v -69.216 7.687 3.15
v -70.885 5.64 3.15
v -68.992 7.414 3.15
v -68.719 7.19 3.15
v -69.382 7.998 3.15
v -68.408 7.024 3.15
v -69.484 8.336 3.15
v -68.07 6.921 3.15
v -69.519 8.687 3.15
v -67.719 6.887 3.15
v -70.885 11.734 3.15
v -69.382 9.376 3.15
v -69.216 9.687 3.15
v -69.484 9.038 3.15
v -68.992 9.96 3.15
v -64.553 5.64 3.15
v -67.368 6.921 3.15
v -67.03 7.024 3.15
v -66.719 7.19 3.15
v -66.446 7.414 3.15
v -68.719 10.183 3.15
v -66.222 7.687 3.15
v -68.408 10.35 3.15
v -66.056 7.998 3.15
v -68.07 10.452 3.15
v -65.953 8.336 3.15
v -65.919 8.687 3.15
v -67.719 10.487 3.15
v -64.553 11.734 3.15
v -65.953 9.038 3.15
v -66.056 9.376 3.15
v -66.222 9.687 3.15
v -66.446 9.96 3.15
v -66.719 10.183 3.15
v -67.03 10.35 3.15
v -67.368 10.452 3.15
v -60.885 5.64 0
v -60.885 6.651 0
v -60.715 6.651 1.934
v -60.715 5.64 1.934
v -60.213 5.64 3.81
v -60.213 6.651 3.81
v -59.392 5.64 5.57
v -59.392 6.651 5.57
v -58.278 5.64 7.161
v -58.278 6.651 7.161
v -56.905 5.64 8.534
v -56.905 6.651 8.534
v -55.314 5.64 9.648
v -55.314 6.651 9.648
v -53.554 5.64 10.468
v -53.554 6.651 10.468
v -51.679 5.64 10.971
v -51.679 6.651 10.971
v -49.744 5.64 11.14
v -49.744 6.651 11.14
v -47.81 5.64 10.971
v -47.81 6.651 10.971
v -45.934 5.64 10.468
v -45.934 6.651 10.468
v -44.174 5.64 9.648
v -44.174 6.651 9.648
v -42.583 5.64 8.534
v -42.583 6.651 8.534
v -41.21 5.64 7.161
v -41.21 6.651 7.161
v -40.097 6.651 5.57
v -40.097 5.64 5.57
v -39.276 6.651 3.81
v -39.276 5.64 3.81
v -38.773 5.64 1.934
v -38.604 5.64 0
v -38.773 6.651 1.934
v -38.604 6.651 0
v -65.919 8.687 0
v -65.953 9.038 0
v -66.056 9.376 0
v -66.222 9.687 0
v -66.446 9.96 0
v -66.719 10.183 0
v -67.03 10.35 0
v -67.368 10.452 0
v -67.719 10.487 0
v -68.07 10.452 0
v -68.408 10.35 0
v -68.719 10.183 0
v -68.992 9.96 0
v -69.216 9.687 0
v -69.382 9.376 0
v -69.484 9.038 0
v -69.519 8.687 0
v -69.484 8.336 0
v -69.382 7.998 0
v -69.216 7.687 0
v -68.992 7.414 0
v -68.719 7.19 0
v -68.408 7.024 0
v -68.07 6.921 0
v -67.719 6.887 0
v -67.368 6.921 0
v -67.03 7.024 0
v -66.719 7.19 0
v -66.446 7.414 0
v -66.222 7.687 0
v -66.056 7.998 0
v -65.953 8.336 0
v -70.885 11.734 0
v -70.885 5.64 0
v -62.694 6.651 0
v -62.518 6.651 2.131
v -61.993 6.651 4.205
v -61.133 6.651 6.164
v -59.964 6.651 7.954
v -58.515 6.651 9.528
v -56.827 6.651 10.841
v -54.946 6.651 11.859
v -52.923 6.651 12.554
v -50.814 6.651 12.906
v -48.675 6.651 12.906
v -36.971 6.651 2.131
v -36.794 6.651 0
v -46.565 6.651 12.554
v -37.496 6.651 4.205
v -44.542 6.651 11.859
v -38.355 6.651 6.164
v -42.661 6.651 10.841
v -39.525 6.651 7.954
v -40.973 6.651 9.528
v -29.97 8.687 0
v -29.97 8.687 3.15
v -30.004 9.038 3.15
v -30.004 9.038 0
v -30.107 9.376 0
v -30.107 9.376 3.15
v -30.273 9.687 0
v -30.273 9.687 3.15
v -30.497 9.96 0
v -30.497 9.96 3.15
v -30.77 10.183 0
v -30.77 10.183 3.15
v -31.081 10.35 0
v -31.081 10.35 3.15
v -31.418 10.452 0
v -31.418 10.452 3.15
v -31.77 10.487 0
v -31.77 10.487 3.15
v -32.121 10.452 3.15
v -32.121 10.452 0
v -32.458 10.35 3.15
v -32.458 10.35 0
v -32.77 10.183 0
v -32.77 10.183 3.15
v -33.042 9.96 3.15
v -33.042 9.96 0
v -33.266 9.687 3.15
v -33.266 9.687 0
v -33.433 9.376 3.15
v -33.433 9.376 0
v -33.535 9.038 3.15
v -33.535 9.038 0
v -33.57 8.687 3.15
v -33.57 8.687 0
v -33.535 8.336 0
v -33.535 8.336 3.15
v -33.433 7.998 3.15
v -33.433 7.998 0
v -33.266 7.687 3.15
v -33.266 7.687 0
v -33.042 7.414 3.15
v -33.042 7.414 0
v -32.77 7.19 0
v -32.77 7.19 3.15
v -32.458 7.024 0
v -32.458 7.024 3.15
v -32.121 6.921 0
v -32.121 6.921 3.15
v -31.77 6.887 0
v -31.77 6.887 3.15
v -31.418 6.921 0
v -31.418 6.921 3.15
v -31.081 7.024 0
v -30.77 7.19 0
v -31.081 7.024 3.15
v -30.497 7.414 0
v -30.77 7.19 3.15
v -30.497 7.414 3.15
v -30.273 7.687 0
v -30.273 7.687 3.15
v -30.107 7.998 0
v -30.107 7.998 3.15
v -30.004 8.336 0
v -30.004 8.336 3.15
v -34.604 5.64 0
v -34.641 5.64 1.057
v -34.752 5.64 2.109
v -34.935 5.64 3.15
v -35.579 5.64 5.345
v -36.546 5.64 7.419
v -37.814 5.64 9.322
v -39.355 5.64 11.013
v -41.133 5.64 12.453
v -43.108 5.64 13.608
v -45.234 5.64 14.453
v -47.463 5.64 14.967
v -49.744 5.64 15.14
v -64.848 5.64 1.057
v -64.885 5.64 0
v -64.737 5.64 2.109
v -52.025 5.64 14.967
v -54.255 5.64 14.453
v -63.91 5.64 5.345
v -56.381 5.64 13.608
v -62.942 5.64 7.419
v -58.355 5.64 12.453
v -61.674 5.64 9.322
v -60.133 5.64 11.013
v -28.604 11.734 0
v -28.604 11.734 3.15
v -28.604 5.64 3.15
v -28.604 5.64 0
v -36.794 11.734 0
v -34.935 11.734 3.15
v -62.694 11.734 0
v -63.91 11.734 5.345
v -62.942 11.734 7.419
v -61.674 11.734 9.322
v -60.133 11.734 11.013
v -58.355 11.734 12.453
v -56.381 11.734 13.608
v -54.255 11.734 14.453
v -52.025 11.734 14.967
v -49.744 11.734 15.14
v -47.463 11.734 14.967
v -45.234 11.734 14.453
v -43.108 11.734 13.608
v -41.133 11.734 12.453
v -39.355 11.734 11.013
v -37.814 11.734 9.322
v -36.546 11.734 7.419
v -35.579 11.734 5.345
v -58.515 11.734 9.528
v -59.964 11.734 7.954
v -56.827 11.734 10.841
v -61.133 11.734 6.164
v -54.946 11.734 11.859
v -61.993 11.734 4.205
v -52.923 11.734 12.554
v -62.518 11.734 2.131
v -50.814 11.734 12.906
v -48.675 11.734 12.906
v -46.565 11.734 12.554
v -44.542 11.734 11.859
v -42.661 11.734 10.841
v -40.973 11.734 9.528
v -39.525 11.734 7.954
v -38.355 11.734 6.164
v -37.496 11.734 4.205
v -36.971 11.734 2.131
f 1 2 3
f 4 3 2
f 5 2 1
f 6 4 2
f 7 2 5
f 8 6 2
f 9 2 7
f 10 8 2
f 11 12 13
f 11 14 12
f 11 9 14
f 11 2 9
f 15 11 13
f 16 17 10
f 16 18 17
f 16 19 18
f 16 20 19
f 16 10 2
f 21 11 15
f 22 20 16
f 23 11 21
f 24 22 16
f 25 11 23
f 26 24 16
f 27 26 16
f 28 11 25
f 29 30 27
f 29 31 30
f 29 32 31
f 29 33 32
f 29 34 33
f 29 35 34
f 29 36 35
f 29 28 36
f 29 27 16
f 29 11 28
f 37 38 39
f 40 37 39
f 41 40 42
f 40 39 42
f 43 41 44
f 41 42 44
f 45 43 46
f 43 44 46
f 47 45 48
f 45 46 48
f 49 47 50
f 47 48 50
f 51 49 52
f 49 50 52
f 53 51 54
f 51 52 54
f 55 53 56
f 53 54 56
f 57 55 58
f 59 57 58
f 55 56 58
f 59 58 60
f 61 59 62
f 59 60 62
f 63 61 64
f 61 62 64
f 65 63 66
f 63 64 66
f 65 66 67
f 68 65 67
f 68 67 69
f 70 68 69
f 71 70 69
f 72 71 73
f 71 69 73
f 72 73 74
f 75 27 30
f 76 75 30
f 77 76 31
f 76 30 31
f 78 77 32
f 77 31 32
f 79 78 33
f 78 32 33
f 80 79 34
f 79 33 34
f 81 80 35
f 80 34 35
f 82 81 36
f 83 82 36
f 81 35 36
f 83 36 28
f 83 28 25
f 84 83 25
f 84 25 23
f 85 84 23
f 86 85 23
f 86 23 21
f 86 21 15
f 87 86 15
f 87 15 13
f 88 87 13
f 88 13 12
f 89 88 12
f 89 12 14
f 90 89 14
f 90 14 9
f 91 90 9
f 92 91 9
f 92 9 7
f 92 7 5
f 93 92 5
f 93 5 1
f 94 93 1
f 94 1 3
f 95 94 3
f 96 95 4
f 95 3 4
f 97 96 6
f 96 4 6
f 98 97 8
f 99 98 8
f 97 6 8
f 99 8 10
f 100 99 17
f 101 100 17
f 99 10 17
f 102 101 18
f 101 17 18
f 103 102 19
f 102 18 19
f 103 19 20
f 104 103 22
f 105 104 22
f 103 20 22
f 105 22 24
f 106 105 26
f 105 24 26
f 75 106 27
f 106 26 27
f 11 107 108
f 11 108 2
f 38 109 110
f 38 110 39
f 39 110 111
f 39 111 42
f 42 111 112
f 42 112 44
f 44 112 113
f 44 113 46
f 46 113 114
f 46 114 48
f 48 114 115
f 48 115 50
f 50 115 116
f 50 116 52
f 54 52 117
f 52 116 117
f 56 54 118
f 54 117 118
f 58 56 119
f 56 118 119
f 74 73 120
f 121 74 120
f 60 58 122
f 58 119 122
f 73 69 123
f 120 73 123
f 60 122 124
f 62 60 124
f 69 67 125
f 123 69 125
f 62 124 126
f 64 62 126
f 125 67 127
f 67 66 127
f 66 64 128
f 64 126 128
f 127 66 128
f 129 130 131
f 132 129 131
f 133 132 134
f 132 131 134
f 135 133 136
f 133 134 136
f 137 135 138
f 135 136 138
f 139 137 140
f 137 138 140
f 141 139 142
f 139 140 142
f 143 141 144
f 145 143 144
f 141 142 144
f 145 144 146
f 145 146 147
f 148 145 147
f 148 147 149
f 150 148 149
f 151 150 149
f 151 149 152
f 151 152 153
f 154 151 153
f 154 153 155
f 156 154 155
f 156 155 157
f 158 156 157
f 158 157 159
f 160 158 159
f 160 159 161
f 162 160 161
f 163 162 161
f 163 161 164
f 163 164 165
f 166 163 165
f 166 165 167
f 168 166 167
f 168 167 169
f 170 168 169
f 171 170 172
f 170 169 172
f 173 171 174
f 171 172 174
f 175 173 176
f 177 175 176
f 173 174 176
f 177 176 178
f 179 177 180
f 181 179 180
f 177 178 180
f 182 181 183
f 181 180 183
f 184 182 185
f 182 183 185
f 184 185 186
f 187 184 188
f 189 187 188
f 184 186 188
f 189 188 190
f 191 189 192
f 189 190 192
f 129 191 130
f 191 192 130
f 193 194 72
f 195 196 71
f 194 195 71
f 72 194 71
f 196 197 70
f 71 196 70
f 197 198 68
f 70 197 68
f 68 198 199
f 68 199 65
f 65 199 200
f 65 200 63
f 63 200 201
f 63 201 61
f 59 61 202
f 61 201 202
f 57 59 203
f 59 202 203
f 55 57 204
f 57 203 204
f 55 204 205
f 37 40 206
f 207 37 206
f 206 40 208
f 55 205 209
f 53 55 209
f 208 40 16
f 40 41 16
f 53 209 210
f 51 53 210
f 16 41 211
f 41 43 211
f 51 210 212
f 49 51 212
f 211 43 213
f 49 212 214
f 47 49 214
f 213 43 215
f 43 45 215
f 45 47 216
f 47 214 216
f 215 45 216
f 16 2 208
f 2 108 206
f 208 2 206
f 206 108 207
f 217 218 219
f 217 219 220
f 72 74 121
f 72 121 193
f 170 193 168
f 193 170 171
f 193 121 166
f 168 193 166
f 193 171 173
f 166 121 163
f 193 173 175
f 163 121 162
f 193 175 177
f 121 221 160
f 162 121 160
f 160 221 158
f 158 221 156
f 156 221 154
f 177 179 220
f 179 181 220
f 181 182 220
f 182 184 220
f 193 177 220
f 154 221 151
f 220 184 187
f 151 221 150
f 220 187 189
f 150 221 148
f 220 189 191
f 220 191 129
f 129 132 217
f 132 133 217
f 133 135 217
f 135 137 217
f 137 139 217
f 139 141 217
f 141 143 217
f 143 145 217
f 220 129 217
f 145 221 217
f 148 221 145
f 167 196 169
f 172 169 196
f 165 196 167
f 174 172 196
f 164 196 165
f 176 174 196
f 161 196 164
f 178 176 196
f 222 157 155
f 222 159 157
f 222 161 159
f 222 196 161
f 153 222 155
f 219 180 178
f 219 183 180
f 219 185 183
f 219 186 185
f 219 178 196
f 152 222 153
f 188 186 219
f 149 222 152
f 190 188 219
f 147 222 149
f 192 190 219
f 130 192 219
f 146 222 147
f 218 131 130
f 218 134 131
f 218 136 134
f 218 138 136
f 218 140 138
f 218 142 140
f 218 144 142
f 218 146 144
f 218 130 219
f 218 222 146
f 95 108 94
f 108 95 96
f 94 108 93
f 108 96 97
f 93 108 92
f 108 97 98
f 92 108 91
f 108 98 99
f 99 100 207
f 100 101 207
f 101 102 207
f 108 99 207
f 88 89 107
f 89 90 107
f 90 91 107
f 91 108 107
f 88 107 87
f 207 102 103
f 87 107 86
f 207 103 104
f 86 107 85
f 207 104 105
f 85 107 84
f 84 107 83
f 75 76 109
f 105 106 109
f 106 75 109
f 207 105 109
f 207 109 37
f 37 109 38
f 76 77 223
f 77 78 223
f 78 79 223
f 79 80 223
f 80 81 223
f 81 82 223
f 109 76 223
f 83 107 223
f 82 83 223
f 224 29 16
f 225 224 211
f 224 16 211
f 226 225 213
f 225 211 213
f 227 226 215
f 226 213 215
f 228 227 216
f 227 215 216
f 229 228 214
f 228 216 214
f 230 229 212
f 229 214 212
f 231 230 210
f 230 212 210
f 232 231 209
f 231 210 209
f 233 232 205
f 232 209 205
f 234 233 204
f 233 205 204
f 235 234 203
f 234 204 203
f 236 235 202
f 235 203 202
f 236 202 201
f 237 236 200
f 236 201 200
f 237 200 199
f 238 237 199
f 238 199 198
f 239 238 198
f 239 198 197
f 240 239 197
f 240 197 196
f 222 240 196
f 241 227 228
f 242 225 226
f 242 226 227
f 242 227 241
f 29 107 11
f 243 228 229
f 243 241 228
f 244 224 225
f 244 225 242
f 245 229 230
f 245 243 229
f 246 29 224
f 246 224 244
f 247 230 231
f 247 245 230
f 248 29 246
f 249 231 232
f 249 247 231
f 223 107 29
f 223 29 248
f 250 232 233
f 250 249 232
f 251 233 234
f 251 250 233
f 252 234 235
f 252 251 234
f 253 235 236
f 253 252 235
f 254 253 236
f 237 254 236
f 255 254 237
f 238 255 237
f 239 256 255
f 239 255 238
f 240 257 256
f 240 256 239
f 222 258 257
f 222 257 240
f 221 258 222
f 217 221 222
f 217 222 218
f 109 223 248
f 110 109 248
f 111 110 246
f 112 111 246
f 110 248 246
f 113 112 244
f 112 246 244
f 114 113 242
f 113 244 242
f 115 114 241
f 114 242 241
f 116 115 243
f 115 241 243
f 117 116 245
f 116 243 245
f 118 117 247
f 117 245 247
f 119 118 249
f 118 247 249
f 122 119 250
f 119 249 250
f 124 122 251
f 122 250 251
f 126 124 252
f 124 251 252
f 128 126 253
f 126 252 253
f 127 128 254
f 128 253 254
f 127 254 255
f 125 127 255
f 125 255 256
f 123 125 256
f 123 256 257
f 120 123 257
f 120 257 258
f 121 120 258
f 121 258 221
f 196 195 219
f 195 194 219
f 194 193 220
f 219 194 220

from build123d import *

# Parameters (mm, degrees)
BOSS_EXTRUDE1_DEPTH     = 5
BOSS_EXTRUDE2_DEPTH     = 3
BOSS_EXTRUDE3_DEPTH     = 3
SKETCH10_W              = 9.5
SKETCH10_H              = 5
BOSS_EXTRUDE4_DEPTH     = 15.78
SKETCH11_W              = 9.5
SKETCH11_H              = 2
BOSS_EXTRUDE5_DEPTH     = 40
BOSS_EXTRUDE6_DEPTH     = 6.09393
SKETCH14_R              = 1.8
CUT_EXTRUDE1_DEPTH      = 6.3
SKETCH15_W              = 51.153217575
SKETCH15_H              = 86.05062267
CUT_EXTRUDE3_DEPTH      = 6
CUT_EXTRUDE3_DEPTH_BACK = 19.78
SKETCH16_W              = 9.603970124
SKETCH16_H              = 11.884913028
CUT_EXTRUDE4_DEPTH      = 17.733728816


with BuildPart() as part:
    # Sketch3 → Revolve1 (revolve)
    with BuildSketch(Plane.XY):
        Polygon((-62.694264441, 10.250679103), (-62.694264441, 11.733728816), (-64.884531744, 11.733728816), (-64.884531744, 5.639799249), (-60.884531744, 5.639799249), (-60.884531744, 6.650679103), (-62.694264441, 6.650679103), align=None)
    revolve(axis=Axis((-49.744264441, 0, 0), (0, 1, 0)))

    # Sketch7 → Boss-Extrude1 (add)
    with BuildSketch(Plane(origin=(0, 11.733728816, 0), x_dir=(1, 0, 0), z_dir=(0, 1, 0))):
        with BuildLine():
            Line((-50.244264441, 15.132008921), (-50.244264441, 12.94034389))
            ThreePointArc((-50.244264441, 12.94034389), (-49.744264441, 12.95), (-49.244264441, 12.94034389))
            Line((-49.244264441, 12.94034389), (-49.244264441, 15.132008921))
            ThreePointArc((-49.244264441, 15.132008921), (-49.744264441, 15.140267302), (-50.244264441, 15.132008921))
        make_face()
    extrude(amount=BOSS_EXTRUDE1_DEPTH)

    # Sketch8 → Boss-Extrude2 (add)
    with BuildSketch(Plane(origin=(0, 16.733728816, 0), x_dir=(1, 0, 0), z_dir=(0, 1, 0))):
        with BuildLine():
            Line((-50.244264441, 15.132008921), (-50.244264441, 12.94034389))
            Line((-50.244264441, 12.94034389), (-50.244264441, -4.55965611))
            Line((-50.244264441, -4.55965611), (-49.244264441, -4.55965611))
            Line((-49.244264441, -4.55965611), (-49.244264441, 12.94034389))
            Line((-49.244264441, 12.94034389), (-49.244264441, 15.132008921))
            ThreePointArc((-49.244264441, 15.132008921), (-49.744264441, 15.140267302), (-50.244264441, 15.132008921))
        make_face()
    extrude(amount=-BOSS_EXTRUDE2_DEPTH)

    # Sketch9 → Boss-Extrude3 (add)
    with BuildSketch(Plane(origin=(0, 11.733728816, 0), x_dir=(1, 0, 0), z_dir=(0, 1, 0))):
        with BuildLine():
            Line((-54.494264441, 14.375854548), (-54.494264441, 39.375854548))
            Line((-54.494264441, 39.375854548), (-44.994264441, 39.375854548))
            Line((-44.994264441, 39.375854548), (-44.994264441, 14.375854548))
            ThreePointArc((-44.994264441, 14.375854548), (-47.092177082, 14.906177465), (-49.244264441, 15.132008921))
            ThreePointArc((-49.244264441, 15.132008921), (-49.744264441, 15.140267302), (-50.244264441, 15.132008921))
            ThreePointArc((-50.244264441, 15.132008921), (-52.3963518, 14.906177465), (-54.494264441, 14.375854548))
        make_face()
    extrude(amount=-BOSS_EXTRUDE3_DEPTH)

    # Sketch10 → Boss-Extrude4 (add)
    with BuildSketch(Plane.XZ.offset(-8.733728816)):
        with Locations((-49.744264441, -36.875854548)):
            Rectangle(SKETCH10_W, SKETCH10_H)
    extrude(amount=BOSS_EXTRUDE4_DEPTH)

    # Sketch11 → Boss-Extrude5 (add)
    with BuildSketch(Plane(origin=(0, 0, -39.375854548), x_dir=(-1, 0, 0), z_dir=(0, 0, -1))):
        with Locations((49.744264441, -6.046271184)):
            Rectangle(SKETCH11_W, SKETCH11_H)
    extrude(amount=BOSS_EXTRUDE5_DEPTH)

    # Sketch13 → Boss-Extrude6 (add)
    with BuildSketch(Plane(origin=(0, 11.733728816, 0), x_dir=(1, 0, 0), z_dir=(0, 1, 0))):
        with BuildLine():
            Line((-28.603997139, 3.15), (-34.935307895, 3.15))
            ThreePointArc((-34.935307895, 3.15), (-34.603997139, 0), (-34.935307895, -3.15))
            Line((-34.935307895, -3.15), (-28.603997139, -3.15))
            Line((-28.603997139, -3.15), (-28.603997139, 3.15))
        make_face()
        with BuildLine():
            Line((-70.884531744, 3.15), (-70.884531744, -3.15))
            Line((-70.884531744, -3.15), (-64.553220987, -3.15))
            ThreePointArc((-64.553220987, -3.15), (-64.884531744, 0), (-64.553220987, 3.15))
            Line((-64.553220987, 3.15), (-70.884531744, 3.15))
        make_face()
    extrude(amount=-BOSS_EXTRUDE6_DEPTH)

    # Sketch14 → Cut-Extrude1 (cut)
    with BuildSketch(Plane.XY.offset(3.15)):
        with Locations((-31.769652517, 8.686764033)):
            Circle(SKETCH14_R)
        with Locations((-67.718876365, 8.686764033)):
            Circle(SKETCH14_R)
    extrude(amount=-CUT_EXTRUDE1_DEPTH, mode=Mode.SUBTRACT)

    # Sketch15 → Cut-Extrude3 (cut, two sides)
    with BuildSketch(Plane(origin=(0, 11.733728816, 0), x_dir=(1, 0, 0), z_dir=(0, 1, 0))) as cut_extrude3_sk:
        with Locations((-49.018725857, 43.025311335)):
            Rectangle(SKETCH15_W, SKETCH15_H)
    extrude(amount=CUT_EXTRUDE3_DEPTH, mode=Mode.SUBTRACT)
    extrude(cut_extrude3_sk.sketch, amount=-CUT_EXTRUDE3_DEPTH_BACK, mode=Mode.SUBTRACT)

    # Sketch16 → Cut-Extrude4 (cut, through all)
    with BuildSketch(Plane(origin=(0, 0, 0), x_dir=(1, 0, 0), z_dir=(0, 1, 0))):
        with Locations((-50.086315959, -0.525030424)):
            Rectangle(SKETCH16_W, SKETCH16_H)
    extrude(amount=CUT_EXTRUDE4_DEPTH, mode=Mode.SUBTRACT)


solid = part.part
